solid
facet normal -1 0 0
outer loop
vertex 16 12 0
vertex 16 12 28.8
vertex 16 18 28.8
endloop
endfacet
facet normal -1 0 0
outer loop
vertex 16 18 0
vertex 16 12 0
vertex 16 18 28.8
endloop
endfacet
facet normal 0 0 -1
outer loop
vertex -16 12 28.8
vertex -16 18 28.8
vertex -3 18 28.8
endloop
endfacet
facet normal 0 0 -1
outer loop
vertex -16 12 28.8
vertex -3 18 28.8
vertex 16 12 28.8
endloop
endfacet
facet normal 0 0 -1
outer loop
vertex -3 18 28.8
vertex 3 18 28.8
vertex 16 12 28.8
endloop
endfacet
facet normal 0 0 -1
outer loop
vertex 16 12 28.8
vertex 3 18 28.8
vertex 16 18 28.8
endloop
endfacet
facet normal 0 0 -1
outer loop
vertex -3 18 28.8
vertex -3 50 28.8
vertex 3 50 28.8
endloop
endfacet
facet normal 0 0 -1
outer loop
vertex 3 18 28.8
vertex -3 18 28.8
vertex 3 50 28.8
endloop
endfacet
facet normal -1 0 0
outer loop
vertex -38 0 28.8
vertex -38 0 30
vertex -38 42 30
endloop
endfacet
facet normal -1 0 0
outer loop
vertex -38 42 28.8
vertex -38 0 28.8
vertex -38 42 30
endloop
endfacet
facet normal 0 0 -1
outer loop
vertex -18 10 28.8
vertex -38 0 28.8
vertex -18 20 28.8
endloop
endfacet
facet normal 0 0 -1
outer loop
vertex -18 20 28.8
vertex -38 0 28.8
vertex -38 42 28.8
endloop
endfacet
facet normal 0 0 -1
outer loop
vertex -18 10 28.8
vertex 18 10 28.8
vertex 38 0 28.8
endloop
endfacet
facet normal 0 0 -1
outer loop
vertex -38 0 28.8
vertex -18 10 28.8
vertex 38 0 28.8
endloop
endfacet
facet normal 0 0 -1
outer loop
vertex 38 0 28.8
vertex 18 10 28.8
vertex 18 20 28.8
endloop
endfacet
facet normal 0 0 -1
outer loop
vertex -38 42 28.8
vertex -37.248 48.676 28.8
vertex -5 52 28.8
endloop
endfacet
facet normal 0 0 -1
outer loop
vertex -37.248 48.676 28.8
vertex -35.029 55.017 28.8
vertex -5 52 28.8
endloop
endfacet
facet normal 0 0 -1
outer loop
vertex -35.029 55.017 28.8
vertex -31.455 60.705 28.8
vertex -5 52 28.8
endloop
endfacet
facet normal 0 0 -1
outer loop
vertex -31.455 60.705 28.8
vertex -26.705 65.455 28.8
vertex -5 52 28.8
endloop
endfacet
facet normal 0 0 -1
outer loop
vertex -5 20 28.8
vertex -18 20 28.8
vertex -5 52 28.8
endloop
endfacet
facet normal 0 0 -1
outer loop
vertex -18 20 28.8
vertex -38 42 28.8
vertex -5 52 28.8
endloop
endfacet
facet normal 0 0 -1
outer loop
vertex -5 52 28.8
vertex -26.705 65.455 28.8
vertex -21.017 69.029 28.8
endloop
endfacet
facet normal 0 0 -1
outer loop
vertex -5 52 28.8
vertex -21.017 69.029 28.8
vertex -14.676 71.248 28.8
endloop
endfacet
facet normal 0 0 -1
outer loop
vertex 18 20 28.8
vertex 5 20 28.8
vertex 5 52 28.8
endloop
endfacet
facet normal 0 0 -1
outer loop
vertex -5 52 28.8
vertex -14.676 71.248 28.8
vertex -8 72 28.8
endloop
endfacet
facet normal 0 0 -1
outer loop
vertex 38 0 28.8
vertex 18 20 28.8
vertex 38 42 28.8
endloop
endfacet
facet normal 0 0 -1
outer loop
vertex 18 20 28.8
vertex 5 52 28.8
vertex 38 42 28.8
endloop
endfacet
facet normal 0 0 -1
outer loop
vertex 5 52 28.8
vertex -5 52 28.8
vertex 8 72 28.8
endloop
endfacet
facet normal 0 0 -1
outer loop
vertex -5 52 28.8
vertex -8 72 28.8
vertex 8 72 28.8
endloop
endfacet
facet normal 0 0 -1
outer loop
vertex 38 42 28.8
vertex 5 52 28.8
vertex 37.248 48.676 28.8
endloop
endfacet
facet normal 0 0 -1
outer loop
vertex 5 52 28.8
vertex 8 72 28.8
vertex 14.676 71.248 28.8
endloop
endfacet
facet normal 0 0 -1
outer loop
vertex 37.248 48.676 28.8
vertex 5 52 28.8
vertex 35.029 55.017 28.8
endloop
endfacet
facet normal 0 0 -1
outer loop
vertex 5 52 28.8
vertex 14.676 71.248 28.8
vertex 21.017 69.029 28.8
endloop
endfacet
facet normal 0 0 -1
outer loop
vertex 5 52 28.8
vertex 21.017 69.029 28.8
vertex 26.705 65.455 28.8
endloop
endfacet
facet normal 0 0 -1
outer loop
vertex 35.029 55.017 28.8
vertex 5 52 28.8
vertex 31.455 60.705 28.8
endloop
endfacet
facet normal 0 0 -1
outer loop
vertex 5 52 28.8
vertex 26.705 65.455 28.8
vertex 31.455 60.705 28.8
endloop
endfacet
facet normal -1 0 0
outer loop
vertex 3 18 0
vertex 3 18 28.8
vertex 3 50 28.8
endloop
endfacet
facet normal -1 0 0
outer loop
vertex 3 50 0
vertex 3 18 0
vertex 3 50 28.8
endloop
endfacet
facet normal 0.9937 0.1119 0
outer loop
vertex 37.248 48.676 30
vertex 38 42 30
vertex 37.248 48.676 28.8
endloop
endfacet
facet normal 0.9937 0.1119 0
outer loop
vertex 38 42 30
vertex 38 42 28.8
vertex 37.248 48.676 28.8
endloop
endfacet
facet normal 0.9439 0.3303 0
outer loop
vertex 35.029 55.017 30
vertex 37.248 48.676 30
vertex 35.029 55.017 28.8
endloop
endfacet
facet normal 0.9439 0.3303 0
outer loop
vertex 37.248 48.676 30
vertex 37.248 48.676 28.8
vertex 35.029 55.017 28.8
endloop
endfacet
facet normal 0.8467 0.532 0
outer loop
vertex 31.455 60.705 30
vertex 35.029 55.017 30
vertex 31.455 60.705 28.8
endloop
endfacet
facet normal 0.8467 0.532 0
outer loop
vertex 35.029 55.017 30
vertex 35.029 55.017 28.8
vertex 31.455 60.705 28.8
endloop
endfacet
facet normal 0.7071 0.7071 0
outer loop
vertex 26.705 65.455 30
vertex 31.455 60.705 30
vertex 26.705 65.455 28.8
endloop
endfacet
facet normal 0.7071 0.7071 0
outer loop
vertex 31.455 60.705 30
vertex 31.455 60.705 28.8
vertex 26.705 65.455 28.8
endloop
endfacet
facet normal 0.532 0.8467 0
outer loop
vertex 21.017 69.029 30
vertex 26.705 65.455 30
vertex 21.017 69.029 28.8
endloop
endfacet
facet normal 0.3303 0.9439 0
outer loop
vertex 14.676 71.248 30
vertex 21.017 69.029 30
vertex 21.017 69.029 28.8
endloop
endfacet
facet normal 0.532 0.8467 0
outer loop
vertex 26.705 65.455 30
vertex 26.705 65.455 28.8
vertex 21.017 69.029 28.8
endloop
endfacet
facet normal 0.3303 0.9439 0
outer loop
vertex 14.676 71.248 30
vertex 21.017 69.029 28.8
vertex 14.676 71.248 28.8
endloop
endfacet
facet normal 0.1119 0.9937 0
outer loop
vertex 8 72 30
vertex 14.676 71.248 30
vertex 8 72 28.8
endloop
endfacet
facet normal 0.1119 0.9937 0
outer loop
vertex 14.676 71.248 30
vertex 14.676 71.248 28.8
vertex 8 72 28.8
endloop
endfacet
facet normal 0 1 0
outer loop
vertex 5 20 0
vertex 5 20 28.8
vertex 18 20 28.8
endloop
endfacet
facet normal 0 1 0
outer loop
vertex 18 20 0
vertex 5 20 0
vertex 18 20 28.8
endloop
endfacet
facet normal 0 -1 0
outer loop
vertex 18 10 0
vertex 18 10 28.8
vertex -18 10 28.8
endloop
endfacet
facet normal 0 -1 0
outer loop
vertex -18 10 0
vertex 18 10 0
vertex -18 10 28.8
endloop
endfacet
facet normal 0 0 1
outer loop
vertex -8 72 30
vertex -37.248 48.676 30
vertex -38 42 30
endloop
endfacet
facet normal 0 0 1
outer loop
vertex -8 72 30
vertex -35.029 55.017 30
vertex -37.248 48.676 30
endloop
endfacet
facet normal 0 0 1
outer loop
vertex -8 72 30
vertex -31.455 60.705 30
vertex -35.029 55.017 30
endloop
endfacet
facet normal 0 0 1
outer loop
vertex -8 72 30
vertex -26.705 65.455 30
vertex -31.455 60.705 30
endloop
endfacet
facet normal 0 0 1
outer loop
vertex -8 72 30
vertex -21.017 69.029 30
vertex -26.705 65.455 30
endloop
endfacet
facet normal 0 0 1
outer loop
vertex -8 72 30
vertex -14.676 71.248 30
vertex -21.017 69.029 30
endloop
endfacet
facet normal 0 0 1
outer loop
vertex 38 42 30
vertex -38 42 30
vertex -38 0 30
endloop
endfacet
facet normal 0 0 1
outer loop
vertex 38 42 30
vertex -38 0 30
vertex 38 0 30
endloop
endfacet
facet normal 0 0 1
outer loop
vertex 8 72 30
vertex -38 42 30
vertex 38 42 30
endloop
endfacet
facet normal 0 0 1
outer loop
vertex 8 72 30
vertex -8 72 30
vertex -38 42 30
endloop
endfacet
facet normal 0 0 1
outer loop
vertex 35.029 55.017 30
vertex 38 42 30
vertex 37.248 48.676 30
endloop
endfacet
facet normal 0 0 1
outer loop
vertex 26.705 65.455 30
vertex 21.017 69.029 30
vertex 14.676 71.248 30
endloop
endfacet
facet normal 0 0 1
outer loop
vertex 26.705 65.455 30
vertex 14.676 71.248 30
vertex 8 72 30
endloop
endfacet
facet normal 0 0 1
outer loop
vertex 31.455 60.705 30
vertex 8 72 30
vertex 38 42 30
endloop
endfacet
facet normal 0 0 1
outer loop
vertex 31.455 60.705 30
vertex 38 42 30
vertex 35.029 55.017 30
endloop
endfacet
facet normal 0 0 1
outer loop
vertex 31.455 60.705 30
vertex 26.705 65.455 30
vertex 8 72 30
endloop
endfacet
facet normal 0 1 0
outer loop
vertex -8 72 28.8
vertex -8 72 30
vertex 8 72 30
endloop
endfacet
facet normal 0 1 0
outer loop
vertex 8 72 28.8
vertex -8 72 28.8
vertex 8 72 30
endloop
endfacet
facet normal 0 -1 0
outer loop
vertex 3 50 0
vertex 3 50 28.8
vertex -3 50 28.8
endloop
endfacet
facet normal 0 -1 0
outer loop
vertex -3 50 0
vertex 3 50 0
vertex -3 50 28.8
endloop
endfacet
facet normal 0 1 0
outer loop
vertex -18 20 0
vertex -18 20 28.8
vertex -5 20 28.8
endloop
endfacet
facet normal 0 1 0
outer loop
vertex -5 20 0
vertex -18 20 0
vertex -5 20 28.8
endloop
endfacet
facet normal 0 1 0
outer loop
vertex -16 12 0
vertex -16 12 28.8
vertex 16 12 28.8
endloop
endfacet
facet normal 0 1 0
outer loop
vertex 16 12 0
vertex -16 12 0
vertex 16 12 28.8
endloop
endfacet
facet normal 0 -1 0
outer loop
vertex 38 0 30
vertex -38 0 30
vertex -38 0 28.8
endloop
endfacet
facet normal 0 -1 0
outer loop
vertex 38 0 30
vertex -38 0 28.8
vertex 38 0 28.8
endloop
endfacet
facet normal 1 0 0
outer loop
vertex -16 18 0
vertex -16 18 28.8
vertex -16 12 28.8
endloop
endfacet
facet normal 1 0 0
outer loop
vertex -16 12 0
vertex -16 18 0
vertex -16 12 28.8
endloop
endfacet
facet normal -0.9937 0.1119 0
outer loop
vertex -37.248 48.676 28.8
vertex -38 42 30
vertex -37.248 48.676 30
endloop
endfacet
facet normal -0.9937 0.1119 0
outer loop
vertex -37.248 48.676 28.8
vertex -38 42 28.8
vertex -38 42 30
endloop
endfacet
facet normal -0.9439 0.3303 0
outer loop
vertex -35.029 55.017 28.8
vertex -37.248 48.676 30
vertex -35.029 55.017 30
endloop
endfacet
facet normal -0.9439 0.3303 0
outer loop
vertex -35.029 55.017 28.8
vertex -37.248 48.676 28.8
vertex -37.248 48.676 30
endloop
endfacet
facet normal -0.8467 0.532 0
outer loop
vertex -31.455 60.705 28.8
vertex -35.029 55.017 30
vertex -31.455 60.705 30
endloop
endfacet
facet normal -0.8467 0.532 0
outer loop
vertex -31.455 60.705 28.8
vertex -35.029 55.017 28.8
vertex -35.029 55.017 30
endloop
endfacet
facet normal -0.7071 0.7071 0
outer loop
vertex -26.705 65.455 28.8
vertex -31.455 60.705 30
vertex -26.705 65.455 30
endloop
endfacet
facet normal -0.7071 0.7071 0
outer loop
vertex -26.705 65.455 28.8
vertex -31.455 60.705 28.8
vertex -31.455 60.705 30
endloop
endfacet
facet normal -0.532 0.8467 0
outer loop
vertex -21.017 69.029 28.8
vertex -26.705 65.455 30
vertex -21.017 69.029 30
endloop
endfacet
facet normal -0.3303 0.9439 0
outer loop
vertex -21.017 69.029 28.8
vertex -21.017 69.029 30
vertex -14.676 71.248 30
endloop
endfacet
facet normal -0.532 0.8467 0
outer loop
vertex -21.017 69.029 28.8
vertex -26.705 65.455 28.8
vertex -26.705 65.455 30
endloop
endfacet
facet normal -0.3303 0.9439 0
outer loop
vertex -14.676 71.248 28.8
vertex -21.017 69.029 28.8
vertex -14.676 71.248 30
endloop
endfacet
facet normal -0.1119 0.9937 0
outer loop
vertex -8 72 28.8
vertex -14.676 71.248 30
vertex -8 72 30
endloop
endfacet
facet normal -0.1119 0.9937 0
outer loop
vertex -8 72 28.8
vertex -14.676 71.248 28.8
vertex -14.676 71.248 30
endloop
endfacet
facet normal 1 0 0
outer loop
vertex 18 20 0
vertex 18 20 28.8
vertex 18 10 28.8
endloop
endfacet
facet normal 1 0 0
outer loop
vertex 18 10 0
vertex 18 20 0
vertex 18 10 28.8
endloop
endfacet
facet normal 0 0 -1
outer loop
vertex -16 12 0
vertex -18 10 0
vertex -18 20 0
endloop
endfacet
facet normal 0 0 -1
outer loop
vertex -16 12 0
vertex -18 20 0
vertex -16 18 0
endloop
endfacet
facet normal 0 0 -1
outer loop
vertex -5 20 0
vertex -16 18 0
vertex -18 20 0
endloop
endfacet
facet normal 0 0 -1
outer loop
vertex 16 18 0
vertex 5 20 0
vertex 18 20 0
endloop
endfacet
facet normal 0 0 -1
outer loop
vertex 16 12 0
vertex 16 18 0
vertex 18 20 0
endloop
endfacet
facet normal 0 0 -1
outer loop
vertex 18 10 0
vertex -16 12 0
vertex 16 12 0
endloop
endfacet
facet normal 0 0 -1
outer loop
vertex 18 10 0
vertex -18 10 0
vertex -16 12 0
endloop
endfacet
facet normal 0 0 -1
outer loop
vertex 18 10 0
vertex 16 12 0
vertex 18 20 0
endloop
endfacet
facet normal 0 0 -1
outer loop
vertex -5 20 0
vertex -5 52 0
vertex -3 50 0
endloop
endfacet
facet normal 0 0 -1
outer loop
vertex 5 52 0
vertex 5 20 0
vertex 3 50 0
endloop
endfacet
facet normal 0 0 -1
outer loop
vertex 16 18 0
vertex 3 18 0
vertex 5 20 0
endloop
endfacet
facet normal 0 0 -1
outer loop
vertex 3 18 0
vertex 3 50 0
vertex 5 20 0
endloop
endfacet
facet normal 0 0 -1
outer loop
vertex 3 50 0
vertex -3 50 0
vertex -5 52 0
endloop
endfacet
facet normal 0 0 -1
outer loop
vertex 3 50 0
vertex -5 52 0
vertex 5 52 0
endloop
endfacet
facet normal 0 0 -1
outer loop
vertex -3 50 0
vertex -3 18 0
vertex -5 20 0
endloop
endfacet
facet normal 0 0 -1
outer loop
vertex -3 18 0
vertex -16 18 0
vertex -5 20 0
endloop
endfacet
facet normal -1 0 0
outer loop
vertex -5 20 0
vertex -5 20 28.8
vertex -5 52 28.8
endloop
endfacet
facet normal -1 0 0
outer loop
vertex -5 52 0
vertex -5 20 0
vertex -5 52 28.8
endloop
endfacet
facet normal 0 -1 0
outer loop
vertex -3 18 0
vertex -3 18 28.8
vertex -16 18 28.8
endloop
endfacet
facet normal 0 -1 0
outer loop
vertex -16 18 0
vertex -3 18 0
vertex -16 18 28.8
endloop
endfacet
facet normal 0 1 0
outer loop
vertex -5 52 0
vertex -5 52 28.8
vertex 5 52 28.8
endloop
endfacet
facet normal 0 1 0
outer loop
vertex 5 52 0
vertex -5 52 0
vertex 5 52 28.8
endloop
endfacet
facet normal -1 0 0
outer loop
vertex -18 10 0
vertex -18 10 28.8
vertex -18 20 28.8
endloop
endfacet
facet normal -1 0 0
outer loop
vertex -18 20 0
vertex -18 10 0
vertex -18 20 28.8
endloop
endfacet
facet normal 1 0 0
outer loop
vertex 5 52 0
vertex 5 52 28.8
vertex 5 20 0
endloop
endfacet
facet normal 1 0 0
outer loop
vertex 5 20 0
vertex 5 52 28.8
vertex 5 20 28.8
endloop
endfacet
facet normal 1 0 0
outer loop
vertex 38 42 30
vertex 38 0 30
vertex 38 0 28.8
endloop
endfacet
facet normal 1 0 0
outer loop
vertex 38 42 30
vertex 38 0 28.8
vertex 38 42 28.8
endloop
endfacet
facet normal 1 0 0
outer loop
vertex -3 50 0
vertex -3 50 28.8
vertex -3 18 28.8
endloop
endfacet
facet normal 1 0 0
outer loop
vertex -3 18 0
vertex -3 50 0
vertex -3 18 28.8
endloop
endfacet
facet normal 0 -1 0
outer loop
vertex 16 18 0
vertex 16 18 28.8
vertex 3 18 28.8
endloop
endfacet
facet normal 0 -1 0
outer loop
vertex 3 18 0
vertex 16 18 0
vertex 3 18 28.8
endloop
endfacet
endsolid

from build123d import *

# Parameters (mm, degrees)
F1_W     = 76
F1_H     = 72
F2_DEPTH = 1.2
F3_R     = 30
F5_DEPTH = 28.8


with BuildPart() as f2:
    # F1 (on offset) → F2 (new body)
    with BuildSketch(Plane.XY.offset(30)):
        with Locations((0, 36)):
            Rectangle(F1_W, F1_H)
    extrude(amount=-F2_DEPTH)

    # F3
    f3_edges = [f2.edges().sort_by_distance(p)[0] for p in [
        (-38, 72, 29.4),
        (38, 72, 29.4),
    ]]
    fillet(f3_edges, radius=F3_R)

    # F4 (on face) → F5 (join, through all)
    with BuildSketch(Plane(origin=(0, 0, 28.8), x_dir=(1, 0, 0), z_dir=(0, 0, -1))):
        Polygon((5, -20), (18, -20), (18, -10), (-18, -10), (-18, -20), (-5, -20), (-5, -52), (5, -52), align=None)
        Polygon((3, -18), (3, -50), (-3, -50), (-3, -18), (-16, -18), (-16, -12), (16, -12), (16, -18), align=None, mode=Mode.SUBTRACT)
    extrude(amount=F5_DEPTH)


solid = f2.part
